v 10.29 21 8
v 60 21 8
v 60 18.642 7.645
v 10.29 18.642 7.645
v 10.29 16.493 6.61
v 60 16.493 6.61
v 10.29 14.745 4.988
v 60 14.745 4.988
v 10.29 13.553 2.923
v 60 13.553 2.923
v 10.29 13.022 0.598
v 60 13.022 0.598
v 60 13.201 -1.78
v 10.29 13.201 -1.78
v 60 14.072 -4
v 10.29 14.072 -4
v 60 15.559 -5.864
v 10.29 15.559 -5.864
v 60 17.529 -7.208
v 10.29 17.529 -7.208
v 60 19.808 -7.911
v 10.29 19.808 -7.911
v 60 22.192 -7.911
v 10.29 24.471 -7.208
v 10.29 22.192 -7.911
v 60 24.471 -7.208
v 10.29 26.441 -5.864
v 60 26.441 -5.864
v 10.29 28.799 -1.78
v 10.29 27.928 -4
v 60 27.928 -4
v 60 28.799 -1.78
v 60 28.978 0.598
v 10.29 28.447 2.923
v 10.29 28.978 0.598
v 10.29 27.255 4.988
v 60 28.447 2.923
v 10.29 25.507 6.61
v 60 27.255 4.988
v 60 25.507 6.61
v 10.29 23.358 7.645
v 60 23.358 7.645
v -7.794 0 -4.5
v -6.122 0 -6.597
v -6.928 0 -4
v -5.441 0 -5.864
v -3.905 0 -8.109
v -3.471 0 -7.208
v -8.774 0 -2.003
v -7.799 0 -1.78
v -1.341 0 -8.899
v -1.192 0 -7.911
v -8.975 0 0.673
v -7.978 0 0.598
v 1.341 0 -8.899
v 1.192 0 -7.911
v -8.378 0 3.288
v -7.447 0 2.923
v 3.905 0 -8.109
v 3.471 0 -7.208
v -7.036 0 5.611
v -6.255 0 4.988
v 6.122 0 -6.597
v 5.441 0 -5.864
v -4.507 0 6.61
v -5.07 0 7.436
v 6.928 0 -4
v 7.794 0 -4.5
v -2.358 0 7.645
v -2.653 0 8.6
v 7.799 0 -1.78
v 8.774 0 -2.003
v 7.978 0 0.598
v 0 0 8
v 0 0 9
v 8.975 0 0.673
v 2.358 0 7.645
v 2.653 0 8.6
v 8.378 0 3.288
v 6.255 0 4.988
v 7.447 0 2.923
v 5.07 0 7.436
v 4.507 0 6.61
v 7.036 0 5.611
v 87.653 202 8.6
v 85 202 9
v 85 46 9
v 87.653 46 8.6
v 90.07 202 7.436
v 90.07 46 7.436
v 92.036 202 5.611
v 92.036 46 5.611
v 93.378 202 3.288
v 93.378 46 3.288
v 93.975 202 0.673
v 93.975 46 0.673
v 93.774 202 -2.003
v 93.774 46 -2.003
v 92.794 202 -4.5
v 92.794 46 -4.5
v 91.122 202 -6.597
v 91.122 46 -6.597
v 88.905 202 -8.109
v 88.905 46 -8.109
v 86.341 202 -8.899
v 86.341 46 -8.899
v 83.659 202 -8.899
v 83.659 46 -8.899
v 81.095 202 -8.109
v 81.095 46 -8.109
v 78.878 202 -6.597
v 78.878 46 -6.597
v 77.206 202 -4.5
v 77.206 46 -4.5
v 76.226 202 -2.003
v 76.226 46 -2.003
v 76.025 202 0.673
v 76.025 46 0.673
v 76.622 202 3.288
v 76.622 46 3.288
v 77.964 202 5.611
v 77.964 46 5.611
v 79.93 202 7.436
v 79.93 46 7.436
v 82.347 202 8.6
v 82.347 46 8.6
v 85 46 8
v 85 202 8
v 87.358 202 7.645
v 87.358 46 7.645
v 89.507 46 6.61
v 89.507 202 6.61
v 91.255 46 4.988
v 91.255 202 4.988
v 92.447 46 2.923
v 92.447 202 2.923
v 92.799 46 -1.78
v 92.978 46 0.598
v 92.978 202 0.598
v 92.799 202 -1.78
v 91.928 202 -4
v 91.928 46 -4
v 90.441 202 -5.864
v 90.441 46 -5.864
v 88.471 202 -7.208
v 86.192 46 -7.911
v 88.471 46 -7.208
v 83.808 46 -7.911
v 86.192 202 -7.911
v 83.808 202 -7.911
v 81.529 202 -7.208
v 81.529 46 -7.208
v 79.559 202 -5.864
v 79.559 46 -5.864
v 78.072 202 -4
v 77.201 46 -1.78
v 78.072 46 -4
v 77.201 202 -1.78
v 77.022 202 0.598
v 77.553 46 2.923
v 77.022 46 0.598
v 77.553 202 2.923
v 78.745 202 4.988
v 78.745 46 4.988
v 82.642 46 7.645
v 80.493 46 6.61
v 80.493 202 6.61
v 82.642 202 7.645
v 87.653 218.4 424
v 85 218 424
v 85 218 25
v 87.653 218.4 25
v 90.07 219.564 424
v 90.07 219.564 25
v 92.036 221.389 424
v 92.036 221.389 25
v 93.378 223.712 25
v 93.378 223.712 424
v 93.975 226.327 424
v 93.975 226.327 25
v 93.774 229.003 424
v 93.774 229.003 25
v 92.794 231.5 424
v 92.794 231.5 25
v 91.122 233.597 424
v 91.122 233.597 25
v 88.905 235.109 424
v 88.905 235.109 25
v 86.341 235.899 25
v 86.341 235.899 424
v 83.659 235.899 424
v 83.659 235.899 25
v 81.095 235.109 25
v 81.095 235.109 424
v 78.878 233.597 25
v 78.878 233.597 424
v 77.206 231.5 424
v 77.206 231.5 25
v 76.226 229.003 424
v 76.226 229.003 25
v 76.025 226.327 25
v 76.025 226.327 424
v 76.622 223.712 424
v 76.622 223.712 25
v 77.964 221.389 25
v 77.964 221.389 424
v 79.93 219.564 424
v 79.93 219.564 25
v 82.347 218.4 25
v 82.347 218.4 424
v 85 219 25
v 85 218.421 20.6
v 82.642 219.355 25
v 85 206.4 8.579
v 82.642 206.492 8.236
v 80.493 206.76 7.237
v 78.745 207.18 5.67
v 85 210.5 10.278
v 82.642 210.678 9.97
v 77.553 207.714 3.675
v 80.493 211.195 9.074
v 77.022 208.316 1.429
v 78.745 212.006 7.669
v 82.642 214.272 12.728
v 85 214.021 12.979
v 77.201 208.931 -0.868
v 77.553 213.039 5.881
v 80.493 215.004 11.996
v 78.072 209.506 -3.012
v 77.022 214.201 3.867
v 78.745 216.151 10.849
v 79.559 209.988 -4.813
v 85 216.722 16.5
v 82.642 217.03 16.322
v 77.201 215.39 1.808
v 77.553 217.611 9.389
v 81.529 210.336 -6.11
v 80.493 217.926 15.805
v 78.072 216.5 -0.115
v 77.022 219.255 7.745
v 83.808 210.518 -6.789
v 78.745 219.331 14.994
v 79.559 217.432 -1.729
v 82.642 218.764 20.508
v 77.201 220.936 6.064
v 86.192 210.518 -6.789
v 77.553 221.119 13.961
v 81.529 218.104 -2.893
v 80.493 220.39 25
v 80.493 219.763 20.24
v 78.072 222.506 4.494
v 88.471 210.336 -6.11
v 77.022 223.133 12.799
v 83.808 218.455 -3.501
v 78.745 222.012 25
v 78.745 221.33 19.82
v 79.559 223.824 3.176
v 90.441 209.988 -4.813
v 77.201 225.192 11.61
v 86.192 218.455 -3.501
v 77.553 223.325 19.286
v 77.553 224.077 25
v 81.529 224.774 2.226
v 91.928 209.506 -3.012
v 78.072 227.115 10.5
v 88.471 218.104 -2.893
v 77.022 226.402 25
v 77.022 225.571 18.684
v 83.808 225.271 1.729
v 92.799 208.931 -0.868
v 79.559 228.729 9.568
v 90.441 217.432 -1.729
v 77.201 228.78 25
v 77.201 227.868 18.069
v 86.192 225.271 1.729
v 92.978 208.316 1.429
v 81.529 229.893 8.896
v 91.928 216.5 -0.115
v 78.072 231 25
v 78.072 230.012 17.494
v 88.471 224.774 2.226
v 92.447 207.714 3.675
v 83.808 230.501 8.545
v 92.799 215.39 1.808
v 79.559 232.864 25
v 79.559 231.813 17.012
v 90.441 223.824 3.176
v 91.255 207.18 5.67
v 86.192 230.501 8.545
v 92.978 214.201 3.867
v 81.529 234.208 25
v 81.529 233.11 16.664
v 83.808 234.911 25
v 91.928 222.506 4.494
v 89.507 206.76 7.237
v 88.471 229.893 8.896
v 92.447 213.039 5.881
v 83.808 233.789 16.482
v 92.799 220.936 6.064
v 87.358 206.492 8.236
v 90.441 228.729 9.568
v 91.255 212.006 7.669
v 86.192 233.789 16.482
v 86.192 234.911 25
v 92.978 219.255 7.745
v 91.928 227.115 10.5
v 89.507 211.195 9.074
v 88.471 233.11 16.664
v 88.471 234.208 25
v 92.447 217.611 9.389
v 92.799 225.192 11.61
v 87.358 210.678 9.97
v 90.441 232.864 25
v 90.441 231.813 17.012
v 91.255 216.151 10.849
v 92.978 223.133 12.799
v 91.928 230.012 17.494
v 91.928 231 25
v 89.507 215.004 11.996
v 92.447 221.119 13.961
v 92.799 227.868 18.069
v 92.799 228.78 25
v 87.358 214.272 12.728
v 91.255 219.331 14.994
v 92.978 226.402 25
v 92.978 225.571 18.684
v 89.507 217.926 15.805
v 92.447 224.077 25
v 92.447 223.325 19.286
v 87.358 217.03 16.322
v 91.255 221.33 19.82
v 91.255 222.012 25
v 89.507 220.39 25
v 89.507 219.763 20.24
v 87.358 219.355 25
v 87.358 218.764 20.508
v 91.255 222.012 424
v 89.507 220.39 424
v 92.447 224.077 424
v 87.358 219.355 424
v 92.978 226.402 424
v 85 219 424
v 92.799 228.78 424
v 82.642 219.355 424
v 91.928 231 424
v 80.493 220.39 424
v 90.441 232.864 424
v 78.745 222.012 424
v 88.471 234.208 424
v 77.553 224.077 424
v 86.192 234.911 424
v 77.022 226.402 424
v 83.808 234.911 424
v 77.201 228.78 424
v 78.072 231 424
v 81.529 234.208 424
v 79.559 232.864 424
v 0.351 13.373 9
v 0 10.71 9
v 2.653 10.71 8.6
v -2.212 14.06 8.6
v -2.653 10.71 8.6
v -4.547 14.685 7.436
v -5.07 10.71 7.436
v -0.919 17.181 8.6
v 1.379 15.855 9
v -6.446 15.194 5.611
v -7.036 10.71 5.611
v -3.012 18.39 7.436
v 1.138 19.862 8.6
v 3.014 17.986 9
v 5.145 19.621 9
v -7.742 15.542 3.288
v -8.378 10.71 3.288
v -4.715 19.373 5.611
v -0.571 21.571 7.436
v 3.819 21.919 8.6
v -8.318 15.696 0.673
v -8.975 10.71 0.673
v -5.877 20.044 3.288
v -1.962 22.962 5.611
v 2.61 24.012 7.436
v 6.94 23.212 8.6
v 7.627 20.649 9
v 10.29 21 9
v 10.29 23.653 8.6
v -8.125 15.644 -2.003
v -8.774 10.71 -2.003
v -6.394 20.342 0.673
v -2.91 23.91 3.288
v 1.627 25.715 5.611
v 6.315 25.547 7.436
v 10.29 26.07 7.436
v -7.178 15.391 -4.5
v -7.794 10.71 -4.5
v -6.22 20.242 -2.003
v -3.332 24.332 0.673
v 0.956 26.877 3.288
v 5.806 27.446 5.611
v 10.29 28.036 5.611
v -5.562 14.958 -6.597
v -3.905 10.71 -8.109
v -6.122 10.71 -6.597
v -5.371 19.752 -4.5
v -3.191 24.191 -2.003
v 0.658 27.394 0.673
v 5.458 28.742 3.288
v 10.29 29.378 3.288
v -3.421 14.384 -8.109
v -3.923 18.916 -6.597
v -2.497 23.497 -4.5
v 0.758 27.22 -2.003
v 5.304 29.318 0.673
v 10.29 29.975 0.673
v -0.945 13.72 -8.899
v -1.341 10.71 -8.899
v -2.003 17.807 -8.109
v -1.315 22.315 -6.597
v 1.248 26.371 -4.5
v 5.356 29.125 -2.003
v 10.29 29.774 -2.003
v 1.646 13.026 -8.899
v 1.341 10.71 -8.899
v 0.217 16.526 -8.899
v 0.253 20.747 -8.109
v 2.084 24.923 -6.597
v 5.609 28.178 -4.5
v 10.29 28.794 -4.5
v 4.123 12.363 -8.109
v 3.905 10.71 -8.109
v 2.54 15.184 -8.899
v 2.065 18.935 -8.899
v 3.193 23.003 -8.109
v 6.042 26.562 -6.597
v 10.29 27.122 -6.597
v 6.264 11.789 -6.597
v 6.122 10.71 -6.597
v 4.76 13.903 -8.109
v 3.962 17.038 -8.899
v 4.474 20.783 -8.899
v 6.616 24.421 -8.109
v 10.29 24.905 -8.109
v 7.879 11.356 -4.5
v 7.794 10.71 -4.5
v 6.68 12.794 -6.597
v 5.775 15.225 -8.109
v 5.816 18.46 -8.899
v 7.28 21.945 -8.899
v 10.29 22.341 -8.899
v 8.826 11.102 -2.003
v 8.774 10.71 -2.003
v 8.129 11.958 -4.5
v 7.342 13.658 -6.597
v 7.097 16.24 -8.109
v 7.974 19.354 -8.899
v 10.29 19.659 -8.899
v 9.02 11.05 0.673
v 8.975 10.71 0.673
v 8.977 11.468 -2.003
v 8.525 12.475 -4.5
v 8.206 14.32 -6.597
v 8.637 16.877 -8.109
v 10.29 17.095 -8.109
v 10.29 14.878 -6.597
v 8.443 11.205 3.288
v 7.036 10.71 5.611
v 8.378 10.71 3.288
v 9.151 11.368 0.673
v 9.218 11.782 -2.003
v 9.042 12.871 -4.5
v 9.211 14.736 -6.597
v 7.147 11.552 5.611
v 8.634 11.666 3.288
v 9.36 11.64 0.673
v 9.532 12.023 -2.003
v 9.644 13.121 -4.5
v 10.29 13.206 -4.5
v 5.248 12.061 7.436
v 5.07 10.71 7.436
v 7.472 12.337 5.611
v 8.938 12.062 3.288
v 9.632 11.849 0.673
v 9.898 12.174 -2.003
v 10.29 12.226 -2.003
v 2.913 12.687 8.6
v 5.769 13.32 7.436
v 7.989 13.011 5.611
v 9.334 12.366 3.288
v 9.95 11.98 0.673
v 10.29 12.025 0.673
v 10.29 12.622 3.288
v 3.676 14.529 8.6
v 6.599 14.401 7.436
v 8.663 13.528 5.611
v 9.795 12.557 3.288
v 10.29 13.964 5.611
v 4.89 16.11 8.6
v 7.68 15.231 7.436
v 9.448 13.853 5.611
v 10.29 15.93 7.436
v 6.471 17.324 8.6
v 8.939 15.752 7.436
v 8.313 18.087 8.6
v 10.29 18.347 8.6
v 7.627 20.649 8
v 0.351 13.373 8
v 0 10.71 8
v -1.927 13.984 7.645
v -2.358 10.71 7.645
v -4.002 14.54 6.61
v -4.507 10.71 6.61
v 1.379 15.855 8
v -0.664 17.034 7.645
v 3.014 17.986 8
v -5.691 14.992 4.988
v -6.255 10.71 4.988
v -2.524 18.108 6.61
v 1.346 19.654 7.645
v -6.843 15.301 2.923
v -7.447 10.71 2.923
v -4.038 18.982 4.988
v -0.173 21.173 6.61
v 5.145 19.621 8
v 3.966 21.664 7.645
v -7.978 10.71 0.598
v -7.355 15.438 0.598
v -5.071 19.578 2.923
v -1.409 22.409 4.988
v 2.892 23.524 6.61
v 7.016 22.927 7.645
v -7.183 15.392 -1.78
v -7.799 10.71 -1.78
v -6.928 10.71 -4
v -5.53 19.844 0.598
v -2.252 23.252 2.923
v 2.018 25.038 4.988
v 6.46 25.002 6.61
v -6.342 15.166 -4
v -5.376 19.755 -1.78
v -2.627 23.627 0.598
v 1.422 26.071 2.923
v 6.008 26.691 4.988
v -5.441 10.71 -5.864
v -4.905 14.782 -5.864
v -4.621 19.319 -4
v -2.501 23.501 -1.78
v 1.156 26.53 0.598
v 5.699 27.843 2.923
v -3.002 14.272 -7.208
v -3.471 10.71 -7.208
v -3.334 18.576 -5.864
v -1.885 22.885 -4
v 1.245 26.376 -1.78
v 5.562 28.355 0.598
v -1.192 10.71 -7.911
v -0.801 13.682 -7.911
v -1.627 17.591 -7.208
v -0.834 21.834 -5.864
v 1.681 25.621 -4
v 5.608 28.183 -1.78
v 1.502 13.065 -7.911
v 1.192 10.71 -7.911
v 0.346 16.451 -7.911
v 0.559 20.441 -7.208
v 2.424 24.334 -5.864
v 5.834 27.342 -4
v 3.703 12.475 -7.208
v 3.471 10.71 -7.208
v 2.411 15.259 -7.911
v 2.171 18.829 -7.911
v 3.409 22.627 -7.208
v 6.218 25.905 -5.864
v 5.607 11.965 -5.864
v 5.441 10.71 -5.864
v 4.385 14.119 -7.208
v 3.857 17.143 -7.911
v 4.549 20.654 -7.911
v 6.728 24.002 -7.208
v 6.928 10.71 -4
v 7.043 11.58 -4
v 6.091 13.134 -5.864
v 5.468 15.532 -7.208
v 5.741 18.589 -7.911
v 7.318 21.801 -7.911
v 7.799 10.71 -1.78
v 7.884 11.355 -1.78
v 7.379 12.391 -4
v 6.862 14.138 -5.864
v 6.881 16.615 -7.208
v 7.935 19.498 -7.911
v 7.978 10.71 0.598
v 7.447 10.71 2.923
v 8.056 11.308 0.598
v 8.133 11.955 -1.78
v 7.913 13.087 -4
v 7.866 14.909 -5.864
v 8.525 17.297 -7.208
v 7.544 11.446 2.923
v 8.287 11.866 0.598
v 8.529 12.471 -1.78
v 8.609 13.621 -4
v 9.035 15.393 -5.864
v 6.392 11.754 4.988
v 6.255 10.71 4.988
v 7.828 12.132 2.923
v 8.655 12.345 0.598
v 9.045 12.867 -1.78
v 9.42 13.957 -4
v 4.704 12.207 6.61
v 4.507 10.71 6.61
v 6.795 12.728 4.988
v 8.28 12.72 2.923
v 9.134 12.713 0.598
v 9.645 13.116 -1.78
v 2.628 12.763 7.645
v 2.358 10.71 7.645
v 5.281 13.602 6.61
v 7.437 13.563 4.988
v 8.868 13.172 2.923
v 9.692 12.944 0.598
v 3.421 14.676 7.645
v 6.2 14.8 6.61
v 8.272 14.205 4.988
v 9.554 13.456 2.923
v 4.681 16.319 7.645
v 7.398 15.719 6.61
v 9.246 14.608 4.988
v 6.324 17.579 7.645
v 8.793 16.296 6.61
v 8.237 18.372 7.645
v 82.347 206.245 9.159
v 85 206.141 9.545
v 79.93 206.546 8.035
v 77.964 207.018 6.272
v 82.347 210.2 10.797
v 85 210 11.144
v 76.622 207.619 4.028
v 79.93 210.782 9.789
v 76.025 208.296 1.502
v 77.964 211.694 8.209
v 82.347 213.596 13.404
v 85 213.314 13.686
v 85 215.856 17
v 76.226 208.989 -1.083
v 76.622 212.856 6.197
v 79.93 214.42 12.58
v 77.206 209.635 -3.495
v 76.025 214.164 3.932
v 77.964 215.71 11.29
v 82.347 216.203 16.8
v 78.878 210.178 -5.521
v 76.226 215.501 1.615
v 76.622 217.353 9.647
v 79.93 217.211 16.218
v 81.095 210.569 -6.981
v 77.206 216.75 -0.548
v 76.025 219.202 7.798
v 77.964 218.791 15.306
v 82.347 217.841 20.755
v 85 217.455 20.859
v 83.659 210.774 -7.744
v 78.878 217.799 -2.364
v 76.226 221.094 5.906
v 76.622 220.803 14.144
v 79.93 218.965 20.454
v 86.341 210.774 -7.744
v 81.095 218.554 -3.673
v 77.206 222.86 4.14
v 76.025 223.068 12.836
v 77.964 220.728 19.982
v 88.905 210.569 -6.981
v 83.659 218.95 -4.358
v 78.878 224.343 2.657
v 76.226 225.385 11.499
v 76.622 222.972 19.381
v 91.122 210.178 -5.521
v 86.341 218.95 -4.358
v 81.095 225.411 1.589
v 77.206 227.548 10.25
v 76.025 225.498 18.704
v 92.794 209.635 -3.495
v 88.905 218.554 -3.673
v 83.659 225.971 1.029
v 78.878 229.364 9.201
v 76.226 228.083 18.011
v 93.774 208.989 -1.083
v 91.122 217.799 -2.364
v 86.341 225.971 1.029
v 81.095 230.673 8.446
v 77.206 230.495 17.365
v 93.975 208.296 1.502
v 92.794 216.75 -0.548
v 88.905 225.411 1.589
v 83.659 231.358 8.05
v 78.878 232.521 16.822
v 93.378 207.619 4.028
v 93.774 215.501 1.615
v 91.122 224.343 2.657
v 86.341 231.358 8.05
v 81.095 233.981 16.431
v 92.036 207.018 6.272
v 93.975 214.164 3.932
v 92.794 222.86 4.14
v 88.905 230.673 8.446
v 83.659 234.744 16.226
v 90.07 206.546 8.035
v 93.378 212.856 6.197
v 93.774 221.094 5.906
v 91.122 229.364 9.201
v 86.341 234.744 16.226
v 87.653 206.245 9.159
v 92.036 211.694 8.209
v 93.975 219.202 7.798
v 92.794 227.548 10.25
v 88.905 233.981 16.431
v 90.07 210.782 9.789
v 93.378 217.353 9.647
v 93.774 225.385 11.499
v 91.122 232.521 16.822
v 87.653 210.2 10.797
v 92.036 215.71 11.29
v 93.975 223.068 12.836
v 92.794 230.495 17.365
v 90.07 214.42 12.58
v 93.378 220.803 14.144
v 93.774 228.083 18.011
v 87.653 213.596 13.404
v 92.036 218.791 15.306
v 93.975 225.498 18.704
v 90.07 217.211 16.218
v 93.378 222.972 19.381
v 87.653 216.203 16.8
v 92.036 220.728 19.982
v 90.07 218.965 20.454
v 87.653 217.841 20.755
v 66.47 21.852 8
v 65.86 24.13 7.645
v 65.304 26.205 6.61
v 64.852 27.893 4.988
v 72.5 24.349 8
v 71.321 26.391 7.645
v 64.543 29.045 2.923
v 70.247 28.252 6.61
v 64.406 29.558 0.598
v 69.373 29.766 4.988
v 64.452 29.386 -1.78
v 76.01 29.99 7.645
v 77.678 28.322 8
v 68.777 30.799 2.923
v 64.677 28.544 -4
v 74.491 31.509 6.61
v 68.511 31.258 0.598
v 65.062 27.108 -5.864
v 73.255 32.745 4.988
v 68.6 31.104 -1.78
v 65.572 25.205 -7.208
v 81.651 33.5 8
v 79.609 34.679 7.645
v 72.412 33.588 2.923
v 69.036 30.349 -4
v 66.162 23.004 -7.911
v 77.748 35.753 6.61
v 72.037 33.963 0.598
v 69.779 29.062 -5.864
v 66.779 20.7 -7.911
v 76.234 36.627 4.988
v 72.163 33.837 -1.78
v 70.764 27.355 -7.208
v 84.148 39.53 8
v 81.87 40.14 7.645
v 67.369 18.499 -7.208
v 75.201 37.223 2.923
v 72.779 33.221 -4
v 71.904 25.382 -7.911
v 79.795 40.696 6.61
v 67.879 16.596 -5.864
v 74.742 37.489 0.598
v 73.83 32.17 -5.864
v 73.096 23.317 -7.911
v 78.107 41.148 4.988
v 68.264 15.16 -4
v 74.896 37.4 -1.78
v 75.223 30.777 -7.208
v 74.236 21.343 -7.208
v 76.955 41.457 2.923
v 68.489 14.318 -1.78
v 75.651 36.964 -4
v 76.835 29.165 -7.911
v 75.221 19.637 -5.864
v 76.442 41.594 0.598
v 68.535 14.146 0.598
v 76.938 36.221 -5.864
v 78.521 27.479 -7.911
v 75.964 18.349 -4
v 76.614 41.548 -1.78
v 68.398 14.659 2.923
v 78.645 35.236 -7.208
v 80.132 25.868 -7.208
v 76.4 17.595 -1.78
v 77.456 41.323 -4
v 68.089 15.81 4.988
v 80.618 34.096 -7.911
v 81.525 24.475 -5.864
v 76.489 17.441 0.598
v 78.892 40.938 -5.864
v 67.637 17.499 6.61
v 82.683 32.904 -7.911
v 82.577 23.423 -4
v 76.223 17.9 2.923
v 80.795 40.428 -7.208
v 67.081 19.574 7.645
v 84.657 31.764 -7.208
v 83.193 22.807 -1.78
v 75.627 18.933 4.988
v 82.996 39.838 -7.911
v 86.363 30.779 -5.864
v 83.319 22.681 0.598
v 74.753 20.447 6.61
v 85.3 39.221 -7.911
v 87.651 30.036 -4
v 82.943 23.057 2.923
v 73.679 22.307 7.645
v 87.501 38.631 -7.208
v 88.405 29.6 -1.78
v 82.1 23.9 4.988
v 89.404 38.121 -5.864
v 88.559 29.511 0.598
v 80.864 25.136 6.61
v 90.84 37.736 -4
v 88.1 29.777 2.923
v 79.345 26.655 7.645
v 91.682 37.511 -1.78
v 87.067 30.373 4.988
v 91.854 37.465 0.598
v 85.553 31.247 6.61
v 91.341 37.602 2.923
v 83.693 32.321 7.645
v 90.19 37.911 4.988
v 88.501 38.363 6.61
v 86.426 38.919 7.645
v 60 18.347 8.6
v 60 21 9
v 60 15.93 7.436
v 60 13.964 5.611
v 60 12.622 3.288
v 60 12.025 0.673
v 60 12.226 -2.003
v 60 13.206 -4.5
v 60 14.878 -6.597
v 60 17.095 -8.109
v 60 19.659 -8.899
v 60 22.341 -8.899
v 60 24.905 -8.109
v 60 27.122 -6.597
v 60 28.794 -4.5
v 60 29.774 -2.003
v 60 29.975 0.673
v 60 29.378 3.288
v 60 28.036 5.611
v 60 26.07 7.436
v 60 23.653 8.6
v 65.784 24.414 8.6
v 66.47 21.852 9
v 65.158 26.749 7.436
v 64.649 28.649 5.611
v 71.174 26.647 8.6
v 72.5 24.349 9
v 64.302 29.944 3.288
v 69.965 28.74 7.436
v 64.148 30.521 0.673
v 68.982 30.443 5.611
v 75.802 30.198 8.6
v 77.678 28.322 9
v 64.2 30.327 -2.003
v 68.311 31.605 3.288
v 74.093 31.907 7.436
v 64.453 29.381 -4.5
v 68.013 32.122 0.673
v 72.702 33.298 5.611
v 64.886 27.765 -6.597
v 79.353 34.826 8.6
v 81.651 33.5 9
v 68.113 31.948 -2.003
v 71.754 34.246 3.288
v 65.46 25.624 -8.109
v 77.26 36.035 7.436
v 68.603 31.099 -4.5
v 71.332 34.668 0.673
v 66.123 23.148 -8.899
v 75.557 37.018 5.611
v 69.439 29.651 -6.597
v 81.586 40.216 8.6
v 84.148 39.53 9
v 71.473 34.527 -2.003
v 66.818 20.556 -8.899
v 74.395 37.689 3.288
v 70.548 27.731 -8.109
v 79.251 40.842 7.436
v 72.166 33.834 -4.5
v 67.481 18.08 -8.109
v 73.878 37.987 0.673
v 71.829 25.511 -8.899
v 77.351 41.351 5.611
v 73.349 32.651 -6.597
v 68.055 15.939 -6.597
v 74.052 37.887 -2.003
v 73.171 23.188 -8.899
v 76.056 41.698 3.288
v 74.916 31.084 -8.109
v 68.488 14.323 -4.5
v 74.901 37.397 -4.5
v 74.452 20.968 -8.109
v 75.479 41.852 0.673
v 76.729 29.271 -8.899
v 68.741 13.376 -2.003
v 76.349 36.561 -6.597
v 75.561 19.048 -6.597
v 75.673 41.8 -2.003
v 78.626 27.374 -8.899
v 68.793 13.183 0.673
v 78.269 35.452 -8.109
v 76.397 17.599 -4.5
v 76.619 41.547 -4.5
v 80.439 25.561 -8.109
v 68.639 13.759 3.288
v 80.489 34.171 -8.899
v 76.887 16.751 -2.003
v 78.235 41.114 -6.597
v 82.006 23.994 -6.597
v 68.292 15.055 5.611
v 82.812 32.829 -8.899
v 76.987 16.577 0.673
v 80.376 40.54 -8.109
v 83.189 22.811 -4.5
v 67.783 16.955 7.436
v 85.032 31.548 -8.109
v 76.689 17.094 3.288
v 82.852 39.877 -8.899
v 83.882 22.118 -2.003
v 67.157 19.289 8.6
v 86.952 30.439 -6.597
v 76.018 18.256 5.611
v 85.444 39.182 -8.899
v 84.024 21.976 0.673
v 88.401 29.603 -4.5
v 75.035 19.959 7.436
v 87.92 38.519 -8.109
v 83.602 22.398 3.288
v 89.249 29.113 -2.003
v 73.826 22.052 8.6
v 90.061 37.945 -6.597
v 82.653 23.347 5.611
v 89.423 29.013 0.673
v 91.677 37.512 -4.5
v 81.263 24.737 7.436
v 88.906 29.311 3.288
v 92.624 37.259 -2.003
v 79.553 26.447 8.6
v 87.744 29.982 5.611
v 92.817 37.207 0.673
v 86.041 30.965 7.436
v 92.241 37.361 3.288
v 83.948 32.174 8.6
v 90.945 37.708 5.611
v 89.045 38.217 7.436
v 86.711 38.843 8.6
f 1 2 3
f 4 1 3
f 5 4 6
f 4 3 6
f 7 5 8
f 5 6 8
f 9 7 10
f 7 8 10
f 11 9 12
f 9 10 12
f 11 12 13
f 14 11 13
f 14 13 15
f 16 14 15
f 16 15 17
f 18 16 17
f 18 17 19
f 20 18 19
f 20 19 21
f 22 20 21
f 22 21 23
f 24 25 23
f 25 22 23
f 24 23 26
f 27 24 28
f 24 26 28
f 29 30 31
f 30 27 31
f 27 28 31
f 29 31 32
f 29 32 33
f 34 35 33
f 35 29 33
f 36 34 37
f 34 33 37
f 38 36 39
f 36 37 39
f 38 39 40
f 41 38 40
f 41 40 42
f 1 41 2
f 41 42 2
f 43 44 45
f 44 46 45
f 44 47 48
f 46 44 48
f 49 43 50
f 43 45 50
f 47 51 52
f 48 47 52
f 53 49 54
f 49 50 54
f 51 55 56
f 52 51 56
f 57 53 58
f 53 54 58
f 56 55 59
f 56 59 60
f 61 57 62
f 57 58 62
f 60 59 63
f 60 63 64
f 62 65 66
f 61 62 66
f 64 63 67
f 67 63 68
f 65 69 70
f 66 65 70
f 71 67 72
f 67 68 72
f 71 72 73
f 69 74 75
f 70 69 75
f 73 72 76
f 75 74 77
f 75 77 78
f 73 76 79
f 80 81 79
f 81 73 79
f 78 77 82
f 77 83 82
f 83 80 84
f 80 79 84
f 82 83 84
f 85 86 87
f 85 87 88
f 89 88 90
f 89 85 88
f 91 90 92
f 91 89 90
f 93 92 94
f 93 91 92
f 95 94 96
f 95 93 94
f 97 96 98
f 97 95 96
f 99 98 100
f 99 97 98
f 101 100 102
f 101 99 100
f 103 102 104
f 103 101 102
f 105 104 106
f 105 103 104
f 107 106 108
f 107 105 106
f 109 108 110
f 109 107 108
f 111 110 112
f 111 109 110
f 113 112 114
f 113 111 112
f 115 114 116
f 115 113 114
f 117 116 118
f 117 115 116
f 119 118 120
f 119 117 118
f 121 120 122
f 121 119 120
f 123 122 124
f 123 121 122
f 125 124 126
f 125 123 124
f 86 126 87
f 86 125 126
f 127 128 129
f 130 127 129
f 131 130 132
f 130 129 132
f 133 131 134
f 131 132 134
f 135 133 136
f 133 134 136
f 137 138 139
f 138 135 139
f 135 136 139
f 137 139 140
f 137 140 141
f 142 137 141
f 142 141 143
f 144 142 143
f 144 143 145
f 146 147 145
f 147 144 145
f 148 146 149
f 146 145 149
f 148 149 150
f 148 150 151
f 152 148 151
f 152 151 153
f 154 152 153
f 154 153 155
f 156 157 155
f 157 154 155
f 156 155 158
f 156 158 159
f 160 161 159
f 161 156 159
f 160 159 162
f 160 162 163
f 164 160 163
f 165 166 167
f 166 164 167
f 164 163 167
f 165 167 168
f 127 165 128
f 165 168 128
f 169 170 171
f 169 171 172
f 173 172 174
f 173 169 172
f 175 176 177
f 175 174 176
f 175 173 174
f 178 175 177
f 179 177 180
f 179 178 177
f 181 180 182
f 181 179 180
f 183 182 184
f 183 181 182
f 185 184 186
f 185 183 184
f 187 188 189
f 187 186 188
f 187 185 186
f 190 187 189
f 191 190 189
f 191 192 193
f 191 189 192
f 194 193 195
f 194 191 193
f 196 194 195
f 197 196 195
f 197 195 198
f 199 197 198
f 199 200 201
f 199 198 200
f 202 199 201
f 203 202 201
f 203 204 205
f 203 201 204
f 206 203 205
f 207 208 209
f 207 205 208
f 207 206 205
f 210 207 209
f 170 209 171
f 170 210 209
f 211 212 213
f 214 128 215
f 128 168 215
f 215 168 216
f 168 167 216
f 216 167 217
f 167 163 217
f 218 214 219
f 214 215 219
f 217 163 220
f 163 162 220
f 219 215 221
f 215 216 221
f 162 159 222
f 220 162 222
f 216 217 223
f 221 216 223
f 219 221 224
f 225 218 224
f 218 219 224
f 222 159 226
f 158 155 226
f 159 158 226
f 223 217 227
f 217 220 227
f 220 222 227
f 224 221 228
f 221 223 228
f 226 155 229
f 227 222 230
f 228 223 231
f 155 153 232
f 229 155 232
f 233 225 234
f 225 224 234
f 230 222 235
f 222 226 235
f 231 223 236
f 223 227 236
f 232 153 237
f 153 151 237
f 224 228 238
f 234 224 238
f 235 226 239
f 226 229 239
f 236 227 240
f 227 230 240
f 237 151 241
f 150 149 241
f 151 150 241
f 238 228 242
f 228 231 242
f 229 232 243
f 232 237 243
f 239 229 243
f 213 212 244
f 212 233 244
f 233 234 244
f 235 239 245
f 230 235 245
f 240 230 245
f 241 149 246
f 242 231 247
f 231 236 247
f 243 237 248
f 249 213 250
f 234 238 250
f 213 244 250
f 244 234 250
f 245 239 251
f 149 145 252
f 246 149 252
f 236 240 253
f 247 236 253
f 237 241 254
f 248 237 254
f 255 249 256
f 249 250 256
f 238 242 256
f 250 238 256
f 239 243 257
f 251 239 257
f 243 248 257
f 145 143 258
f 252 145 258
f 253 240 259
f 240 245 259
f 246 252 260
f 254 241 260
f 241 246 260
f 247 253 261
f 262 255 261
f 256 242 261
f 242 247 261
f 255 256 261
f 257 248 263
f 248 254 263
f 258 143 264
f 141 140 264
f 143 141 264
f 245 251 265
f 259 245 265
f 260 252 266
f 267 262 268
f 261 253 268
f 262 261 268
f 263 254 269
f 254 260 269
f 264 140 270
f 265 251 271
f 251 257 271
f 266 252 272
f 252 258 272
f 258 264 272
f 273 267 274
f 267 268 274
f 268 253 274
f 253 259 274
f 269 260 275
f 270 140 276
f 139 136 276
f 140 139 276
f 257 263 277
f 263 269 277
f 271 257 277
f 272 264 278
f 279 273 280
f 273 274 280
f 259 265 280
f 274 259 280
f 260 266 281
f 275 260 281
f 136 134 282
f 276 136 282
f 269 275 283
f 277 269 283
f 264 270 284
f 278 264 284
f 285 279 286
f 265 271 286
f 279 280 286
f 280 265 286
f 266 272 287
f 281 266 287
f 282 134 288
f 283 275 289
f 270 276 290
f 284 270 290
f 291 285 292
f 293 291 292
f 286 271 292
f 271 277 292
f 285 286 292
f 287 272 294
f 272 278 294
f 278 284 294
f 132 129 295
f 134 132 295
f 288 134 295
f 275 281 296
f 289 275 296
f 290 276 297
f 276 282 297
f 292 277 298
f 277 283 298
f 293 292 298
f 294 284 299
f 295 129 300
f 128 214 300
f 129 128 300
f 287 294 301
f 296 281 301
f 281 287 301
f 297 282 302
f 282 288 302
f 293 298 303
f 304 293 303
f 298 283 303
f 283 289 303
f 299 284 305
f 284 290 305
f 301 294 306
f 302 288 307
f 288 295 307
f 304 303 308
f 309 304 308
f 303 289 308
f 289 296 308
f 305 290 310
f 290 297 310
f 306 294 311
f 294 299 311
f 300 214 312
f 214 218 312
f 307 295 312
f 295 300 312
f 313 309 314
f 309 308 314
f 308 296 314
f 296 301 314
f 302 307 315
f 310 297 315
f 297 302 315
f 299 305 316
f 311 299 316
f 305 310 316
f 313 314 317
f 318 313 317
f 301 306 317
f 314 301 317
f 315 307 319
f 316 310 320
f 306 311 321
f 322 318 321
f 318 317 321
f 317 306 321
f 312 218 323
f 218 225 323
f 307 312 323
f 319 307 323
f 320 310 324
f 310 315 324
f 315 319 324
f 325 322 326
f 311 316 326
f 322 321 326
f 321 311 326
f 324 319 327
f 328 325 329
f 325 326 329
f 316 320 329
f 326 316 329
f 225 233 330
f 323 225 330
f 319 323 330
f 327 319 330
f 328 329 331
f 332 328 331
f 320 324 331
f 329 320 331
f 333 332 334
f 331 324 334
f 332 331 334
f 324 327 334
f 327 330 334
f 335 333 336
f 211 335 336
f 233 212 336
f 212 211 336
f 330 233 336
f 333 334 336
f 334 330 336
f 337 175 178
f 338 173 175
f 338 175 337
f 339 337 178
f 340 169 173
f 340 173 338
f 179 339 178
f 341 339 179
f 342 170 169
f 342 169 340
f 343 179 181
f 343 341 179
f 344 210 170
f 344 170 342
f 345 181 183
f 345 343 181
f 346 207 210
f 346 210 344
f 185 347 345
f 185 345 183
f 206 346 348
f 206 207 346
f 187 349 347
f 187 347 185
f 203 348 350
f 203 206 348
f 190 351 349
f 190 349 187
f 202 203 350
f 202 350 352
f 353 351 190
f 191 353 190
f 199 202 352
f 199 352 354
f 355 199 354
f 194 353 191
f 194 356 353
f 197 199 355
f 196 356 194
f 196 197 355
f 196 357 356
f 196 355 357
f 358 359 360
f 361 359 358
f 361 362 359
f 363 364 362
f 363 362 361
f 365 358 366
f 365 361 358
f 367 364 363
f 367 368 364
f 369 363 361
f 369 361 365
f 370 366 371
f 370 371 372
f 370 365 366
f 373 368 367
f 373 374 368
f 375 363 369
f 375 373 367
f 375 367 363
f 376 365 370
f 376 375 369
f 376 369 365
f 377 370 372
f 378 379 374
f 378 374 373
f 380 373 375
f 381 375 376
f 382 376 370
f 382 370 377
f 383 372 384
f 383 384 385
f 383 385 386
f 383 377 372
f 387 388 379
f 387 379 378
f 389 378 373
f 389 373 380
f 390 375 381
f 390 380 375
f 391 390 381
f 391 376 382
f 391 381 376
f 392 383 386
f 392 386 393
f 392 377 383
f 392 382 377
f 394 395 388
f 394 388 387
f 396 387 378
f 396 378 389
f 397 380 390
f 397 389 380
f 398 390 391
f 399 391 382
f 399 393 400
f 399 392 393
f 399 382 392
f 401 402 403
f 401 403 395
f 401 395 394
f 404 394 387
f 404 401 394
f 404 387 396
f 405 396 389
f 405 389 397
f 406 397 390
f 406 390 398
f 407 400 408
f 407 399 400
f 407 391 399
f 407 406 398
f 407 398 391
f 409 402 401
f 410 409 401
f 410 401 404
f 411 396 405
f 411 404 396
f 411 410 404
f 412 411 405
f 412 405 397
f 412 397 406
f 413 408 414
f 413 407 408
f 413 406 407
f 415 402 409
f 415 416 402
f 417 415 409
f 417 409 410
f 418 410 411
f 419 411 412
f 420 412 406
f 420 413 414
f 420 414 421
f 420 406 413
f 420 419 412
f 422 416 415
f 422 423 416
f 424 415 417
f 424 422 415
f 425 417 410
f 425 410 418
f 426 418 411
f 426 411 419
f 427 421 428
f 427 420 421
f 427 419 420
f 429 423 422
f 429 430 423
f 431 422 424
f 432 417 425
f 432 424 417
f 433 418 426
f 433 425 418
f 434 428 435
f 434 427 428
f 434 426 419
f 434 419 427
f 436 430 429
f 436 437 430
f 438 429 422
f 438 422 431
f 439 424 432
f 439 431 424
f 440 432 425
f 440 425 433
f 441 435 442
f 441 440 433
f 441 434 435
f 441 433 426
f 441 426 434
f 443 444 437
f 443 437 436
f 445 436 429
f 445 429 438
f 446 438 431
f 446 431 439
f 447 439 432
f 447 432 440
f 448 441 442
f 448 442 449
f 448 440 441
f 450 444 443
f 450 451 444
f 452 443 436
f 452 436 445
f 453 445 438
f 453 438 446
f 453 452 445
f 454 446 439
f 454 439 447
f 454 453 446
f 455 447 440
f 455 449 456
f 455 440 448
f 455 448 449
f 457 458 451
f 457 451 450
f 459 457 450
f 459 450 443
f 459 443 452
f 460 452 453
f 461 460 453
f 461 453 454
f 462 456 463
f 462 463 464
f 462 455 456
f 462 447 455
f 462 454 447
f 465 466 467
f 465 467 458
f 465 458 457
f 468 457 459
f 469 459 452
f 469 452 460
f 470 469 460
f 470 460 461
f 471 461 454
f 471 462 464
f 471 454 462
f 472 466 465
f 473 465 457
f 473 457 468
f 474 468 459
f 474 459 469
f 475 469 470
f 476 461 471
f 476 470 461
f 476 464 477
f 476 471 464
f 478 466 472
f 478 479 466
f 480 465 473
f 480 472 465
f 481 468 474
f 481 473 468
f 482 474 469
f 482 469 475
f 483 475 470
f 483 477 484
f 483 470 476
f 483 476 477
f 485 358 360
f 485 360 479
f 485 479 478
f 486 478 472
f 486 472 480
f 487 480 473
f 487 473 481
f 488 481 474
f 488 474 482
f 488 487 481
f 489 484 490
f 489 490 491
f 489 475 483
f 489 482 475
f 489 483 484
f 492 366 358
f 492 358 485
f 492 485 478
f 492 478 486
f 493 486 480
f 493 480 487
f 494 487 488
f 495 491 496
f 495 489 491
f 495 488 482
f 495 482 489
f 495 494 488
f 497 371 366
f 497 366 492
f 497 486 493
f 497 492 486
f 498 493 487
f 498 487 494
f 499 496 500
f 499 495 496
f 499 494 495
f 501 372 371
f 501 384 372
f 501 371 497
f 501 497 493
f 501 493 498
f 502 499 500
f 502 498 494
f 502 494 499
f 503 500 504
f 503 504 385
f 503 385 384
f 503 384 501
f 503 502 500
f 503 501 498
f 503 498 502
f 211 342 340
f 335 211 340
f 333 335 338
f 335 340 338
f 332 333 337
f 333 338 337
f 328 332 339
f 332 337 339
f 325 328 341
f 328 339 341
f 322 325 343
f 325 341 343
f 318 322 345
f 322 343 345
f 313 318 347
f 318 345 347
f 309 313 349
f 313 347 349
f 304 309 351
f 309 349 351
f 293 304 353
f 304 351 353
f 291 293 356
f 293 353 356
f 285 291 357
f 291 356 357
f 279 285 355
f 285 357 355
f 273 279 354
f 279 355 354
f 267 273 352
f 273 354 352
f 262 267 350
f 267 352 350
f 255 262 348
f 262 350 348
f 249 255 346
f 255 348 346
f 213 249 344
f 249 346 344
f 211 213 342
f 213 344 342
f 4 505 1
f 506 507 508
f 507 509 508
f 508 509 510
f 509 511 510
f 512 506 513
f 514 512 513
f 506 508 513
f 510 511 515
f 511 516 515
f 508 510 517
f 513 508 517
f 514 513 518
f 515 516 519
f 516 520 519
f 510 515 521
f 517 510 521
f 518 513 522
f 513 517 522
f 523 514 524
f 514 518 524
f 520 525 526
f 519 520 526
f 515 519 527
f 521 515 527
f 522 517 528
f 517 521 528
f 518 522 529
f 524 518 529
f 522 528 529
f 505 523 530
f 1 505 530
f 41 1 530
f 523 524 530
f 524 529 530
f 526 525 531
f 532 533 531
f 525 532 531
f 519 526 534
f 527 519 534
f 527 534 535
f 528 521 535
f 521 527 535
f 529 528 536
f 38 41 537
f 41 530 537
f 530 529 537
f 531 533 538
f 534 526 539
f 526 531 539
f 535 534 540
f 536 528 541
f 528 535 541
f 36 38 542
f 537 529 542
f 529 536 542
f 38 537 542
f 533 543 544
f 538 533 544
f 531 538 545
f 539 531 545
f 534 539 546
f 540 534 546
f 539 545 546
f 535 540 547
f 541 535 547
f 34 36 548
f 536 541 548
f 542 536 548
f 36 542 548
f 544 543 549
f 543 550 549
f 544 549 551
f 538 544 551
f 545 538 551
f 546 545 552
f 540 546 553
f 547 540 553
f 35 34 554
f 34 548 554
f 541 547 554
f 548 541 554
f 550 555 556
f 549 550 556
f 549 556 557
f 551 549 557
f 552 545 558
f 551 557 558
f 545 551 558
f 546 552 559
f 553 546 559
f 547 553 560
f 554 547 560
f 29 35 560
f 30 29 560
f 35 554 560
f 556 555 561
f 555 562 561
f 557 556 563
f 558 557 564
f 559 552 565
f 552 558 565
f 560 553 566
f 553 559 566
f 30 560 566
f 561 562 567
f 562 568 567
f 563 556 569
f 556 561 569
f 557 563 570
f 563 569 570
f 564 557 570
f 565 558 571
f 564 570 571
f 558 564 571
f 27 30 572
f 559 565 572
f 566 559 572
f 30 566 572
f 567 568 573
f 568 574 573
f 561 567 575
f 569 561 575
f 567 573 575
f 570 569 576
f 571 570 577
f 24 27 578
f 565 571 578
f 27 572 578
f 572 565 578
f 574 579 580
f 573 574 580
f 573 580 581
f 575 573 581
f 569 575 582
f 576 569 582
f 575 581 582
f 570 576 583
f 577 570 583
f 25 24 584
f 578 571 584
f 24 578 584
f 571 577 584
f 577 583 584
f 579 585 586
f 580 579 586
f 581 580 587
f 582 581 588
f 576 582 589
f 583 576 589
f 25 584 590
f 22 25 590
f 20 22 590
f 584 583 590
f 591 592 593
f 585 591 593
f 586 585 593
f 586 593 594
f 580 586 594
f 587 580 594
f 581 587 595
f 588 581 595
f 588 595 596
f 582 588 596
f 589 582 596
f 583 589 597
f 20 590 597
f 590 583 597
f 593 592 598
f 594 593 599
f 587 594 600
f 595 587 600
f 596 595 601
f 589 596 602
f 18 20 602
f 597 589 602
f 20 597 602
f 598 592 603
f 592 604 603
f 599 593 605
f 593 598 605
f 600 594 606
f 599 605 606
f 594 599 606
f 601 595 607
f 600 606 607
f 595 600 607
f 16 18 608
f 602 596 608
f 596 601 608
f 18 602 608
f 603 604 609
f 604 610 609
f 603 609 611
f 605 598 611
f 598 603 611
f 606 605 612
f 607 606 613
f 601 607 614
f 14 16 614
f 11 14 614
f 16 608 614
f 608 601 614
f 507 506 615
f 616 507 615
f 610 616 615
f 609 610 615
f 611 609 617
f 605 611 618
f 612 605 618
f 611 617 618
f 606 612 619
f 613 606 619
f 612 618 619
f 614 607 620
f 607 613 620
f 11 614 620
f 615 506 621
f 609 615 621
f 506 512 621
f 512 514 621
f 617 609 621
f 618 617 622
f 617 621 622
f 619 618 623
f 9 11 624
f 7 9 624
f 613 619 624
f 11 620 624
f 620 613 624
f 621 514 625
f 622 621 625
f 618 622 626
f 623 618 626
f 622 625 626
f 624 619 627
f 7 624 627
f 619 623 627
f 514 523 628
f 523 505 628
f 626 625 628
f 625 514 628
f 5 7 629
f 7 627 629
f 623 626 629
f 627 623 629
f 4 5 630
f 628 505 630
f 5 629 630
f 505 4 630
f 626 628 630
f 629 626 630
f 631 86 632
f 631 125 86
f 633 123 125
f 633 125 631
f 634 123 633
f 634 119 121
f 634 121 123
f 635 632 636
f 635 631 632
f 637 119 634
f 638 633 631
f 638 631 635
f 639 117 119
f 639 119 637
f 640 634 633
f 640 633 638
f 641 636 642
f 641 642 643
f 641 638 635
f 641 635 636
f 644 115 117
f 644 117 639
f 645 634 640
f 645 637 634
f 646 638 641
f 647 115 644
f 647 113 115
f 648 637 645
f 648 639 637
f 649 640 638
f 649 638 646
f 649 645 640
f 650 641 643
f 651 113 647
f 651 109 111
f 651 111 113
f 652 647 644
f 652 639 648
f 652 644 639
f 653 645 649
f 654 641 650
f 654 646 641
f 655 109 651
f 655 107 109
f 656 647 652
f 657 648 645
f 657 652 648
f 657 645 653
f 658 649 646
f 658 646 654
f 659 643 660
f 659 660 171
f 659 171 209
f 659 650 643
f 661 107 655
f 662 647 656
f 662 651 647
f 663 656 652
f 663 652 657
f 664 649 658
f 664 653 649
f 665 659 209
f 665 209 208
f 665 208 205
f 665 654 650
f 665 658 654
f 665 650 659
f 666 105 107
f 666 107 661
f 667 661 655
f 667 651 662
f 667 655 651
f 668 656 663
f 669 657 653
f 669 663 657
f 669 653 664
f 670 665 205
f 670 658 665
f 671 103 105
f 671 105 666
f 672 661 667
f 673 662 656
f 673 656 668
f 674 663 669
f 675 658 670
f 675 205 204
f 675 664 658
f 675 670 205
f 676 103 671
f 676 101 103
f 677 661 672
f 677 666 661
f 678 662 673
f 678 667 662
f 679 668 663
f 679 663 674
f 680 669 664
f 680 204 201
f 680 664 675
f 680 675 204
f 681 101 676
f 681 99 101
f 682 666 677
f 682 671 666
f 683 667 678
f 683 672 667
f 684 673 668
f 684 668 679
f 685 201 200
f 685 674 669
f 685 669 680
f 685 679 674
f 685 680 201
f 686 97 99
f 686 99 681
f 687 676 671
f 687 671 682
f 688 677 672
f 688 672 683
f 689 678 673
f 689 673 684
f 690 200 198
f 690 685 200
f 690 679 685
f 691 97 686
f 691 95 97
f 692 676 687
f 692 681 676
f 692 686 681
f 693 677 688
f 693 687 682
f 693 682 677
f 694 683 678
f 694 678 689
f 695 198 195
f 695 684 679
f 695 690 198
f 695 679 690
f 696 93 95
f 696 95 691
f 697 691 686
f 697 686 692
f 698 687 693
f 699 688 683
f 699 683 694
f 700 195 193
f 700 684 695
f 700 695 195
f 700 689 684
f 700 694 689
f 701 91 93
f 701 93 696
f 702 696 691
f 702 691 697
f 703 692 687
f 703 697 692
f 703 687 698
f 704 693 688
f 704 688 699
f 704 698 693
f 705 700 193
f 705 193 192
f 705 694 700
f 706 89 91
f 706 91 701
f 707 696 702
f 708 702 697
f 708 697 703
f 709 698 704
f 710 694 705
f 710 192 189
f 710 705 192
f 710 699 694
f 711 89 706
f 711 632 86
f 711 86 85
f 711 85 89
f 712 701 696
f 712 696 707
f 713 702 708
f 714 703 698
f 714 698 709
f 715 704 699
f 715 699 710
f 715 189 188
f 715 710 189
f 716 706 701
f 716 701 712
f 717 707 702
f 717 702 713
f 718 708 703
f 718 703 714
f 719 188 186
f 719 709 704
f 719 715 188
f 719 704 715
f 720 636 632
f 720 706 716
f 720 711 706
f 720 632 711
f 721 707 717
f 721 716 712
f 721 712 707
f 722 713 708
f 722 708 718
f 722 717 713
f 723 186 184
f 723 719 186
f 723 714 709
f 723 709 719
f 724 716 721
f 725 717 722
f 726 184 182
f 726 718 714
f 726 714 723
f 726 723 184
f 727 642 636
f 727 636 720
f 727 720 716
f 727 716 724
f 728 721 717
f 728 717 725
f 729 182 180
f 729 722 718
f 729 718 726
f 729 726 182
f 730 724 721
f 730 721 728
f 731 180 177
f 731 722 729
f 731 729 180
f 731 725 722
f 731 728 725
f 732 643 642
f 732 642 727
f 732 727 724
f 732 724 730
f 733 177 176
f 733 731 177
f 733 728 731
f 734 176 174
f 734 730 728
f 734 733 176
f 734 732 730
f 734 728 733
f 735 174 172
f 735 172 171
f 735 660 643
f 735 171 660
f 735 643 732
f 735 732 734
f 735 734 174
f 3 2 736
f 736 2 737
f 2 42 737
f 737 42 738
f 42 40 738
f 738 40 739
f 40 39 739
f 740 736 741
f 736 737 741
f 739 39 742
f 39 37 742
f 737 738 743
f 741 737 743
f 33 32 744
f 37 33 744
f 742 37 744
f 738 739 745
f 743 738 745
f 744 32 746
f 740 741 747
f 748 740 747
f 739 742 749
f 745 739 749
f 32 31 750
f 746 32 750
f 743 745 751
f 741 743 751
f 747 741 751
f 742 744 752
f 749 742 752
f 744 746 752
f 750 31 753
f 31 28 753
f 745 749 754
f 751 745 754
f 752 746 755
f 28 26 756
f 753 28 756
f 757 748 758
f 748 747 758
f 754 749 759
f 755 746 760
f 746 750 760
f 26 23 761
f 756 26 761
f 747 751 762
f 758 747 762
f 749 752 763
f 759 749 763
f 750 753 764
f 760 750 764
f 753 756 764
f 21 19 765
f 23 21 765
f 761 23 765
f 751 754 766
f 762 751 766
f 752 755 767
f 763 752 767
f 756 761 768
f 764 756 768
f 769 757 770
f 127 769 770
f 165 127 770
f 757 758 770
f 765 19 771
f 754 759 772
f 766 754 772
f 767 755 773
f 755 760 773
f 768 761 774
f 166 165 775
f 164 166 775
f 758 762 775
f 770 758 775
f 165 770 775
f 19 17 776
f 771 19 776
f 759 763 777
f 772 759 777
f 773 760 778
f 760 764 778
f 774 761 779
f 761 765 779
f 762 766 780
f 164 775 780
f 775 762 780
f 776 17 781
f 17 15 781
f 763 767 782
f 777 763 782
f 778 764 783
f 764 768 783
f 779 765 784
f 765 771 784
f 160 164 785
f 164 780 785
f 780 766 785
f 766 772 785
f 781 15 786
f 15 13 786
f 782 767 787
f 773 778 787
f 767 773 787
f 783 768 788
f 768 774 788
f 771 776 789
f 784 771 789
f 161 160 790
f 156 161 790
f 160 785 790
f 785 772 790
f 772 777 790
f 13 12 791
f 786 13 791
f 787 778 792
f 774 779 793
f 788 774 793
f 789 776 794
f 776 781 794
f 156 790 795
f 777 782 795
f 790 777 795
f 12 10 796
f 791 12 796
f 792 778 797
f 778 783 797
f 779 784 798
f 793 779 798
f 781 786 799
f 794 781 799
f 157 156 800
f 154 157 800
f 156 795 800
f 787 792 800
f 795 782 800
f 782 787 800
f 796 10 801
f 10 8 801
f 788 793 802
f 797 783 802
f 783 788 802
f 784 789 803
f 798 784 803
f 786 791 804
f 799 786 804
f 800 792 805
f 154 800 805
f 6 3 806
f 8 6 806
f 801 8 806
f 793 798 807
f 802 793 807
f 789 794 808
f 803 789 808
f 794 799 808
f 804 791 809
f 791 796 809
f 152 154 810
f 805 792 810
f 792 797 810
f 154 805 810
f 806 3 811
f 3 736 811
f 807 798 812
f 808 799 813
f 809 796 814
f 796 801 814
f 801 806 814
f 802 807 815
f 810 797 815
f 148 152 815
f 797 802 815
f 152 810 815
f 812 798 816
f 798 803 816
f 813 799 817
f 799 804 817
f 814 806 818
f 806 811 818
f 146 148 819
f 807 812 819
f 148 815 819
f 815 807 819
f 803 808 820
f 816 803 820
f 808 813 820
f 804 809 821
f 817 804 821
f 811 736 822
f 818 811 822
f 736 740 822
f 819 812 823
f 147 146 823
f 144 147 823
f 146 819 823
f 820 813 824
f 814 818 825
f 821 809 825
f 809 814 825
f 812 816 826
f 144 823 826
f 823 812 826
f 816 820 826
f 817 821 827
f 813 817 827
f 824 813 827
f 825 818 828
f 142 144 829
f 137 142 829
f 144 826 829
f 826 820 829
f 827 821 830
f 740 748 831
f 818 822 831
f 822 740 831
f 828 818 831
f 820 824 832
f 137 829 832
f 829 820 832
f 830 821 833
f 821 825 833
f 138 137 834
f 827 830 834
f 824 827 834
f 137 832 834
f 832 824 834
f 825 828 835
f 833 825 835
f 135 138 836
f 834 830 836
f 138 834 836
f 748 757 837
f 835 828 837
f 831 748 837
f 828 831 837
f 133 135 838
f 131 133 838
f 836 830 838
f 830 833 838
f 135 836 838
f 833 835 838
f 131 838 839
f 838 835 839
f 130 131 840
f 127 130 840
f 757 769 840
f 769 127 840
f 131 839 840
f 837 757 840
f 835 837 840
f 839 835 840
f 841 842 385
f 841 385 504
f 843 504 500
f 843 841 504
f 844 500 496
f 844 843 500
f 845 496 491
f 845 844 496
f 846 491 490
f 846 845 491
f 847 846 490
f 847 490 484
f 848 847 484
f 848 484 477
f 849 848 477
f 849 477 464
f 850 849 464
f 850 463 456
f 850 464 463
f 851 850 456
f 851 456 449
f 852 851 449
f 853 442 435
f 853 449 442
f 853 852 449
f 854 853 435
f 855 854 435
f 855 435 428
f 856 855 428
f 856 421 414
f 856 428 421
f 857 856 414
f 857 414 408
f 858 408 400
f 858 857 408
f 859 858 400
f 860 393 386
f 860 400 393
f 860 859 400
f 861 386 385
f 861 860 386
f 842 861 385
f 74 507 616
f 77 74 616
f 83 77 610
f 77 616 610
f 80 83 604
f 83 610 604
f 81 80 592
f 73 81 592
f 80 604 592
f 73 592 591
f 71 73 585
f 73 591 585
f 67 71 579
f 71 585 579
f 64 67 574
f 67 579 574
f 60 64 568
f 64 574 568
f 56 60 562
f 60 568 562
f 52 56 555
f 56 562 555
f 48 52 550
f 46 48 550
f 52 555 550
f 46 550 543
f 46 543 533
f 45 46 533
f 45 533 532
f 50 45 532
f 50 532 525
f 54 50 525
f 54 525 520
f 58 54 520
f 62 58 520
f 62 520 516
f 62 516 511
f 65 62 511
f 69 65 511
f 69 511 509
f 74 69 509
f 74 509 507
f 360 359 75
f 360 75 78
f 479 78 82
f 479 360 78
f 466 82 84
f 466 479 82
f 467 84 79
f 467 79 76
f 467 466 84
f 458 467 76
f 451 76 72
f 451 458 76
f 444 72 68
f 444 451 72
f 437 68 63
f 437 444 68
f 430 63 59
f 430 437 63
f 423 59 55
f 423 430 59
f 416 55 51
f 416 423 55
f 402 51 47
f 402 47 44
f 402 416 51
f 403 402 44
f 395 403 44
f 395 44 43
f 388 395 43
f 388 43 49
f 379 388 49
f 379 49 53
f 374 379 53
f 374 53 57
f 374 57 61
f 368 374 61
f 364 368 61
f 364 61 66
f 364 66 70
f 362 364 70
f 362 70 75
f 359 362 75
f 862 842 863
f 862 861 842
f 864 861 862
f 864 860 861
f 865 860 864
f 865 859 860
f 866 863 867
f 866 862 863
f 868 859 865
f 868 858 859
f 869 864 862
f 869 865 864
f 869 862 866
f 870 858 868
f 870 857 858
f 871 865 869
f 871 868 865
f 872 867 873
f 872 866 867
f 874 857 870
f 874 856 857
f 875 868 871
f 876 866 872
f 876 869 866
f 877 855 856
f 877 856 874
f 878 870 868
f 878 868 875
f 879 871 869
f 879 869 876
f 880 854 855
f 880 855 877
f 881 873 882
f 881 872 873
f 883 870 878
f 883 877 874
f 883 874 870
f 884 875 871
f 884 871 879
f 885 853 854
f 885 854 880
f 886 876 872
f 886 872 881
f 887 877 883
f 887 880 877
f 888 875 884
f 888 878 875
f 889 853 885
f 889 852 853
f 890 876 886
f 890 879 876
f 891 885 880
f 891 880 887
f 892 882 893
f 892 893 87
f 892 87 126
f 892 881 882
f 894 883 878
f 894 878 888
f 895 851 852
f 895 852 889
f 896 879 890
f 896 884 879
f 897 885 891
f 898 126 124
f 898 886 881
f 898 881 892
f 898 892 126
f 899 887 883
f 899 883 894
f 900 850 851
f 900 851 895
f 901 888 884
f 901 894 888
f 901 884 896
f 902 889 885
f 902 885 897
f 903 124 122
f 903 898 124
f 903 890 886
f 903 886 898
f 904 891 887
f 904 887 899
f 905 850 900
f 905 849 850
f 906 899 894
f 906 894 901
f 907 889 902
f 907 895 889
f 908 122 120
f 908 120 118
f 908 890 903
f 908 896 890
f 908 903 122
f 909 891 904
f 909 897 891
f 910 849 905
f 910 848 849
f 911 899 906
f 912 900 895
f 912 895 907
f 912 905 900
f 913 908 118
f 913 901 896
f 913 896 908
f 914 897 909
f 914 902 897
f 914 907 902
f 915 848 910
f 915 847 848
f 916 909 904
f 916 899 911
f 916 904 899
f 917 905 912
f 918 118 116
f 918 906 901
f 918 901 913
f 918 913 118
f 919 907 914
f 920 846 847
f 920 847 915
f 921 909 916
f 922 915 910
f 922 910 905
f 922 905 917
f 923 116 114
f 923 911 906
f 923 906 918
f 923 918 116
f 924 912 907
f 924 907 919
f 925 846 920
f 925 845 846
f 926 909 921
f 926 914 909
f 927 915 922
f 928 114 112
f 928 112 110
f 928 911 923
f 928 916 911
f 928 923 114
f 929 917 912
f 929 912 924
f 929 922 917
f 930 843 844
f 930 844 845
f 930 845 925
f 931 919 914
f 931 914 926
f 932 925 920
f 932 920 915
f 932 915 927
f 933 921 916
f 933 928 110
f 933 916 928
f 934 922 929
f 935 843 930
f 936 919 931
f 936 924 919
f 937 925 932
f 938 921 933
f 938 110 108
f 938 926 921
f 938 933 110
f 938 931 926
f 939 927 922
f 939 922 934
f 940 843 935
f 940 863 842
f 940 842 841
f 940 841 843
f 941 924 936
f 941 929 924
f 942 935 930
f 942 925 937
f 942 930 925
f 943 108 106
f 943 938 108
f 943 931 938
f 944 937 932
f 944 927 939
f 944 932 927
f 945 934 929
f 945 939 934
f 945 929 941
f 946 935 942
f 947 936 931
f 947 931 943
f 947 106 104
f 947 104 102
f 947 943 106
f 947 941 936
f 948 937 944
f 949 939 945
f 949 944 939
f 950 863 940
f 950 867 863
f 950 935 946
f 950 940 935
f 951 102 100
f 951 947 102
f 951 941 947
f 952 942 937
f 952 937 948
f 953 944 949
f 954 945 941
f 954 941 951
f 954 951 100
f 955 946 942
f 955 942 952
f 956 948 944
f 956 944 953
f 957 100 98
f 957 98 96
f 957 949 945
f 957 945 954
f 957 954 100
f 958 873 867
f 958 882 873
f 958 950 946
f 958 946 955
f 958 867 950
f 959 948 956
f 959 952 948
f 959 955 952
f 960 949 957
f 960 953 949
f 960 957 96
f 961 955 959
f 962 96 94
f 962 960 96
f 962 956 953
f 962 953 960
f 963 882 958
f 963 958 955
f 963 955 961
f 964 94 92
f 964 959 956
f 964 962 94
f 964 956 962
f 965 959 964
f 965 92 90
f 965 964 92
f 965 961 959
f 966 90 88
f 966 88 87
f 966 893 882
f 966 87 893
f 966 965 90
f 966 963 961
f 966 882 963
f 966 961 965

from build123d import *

# Parameters (mm, degrees)
SWEEP1_PROFILE_R                           = 9
HOLLOW_TUBE_OD_AND_WALL_PROVISIONAL_PROF_R = 8


with BuildPart() as part:
    # Sweep1: sweep along a curve in space
    with BuildLine() as sweep1_path:
        Line((0, 0, 0), (0, 10.710000757, 0))
        ThreePointArc((0, 10.710000757, 0), (3.013871267, 17.986129267, 0), (10.29, 21, 0))
        Line((10.29, 21, 0), (60.000001606, 21, 0))
        ThreePointArc((60.000001606, 21, 0), (77.677670568, 28.322330568, 0), (85, 46, 0))
        Line((85, 46, 0), (85, 202.000001606, 0))
        ThreePointArc((85, 202.000001606, 0), (85, 219.677670568, 7.322330568), (85, 227, 25))
        Line((85, 227, 25), (85, 227, 424))
    # Sweep1 profile (on start of the path) → Sweep1 (sweep)
    with BuildSketch(Plane.ZX):
        Circle(SWEEP1_PROFILE_R)
    sweep(path=sweep1_path.line)

    # Hollow_tube_OD_and_wall_PROVISIONAL: sweep along a curve in space
    with BuildLine() as hollow_tube_od_and_wall_provisional_path:
        Line((0, 0, 0), (0, 10.710000757, 0))
        ThreePointArc((0, 10.710000757, 0), (3.013871267, 17.986129267, 0), (10.29, 21, 0))
        Line((10.29, 21, 0), (60.000001606, 21, 0))
        ThreePointArc((60.000001606, 21, 0), (77.677670568, 28.322330568, 0), (85, 46, 0))
        Line((85, 46, 0), (85, 202.000001606, 0))
        ThreePointArc((85, 202.000001606, 0), (85, 219.677670568, 7.322330568), (85, 227, 25))
        Line((85, 227, 25), (85, 227, 424))
    # Hollow_tube_OD_and_wall_PROVISIONAL prof (on start of the path) → Hollow_tube_OD_and_wall_PROVISIONAL (sweep, cut)
    with BuildSketch(Plane.ZX):
        Circle(HOLLOW_TUBE_OD_AND_WALL_PROVISIONAL_PROF_R)
    sweep(path=hollow_tube_od_and_wall_provisional_path.line, mode=Mode.SUBTRACT)


solid = part.part
